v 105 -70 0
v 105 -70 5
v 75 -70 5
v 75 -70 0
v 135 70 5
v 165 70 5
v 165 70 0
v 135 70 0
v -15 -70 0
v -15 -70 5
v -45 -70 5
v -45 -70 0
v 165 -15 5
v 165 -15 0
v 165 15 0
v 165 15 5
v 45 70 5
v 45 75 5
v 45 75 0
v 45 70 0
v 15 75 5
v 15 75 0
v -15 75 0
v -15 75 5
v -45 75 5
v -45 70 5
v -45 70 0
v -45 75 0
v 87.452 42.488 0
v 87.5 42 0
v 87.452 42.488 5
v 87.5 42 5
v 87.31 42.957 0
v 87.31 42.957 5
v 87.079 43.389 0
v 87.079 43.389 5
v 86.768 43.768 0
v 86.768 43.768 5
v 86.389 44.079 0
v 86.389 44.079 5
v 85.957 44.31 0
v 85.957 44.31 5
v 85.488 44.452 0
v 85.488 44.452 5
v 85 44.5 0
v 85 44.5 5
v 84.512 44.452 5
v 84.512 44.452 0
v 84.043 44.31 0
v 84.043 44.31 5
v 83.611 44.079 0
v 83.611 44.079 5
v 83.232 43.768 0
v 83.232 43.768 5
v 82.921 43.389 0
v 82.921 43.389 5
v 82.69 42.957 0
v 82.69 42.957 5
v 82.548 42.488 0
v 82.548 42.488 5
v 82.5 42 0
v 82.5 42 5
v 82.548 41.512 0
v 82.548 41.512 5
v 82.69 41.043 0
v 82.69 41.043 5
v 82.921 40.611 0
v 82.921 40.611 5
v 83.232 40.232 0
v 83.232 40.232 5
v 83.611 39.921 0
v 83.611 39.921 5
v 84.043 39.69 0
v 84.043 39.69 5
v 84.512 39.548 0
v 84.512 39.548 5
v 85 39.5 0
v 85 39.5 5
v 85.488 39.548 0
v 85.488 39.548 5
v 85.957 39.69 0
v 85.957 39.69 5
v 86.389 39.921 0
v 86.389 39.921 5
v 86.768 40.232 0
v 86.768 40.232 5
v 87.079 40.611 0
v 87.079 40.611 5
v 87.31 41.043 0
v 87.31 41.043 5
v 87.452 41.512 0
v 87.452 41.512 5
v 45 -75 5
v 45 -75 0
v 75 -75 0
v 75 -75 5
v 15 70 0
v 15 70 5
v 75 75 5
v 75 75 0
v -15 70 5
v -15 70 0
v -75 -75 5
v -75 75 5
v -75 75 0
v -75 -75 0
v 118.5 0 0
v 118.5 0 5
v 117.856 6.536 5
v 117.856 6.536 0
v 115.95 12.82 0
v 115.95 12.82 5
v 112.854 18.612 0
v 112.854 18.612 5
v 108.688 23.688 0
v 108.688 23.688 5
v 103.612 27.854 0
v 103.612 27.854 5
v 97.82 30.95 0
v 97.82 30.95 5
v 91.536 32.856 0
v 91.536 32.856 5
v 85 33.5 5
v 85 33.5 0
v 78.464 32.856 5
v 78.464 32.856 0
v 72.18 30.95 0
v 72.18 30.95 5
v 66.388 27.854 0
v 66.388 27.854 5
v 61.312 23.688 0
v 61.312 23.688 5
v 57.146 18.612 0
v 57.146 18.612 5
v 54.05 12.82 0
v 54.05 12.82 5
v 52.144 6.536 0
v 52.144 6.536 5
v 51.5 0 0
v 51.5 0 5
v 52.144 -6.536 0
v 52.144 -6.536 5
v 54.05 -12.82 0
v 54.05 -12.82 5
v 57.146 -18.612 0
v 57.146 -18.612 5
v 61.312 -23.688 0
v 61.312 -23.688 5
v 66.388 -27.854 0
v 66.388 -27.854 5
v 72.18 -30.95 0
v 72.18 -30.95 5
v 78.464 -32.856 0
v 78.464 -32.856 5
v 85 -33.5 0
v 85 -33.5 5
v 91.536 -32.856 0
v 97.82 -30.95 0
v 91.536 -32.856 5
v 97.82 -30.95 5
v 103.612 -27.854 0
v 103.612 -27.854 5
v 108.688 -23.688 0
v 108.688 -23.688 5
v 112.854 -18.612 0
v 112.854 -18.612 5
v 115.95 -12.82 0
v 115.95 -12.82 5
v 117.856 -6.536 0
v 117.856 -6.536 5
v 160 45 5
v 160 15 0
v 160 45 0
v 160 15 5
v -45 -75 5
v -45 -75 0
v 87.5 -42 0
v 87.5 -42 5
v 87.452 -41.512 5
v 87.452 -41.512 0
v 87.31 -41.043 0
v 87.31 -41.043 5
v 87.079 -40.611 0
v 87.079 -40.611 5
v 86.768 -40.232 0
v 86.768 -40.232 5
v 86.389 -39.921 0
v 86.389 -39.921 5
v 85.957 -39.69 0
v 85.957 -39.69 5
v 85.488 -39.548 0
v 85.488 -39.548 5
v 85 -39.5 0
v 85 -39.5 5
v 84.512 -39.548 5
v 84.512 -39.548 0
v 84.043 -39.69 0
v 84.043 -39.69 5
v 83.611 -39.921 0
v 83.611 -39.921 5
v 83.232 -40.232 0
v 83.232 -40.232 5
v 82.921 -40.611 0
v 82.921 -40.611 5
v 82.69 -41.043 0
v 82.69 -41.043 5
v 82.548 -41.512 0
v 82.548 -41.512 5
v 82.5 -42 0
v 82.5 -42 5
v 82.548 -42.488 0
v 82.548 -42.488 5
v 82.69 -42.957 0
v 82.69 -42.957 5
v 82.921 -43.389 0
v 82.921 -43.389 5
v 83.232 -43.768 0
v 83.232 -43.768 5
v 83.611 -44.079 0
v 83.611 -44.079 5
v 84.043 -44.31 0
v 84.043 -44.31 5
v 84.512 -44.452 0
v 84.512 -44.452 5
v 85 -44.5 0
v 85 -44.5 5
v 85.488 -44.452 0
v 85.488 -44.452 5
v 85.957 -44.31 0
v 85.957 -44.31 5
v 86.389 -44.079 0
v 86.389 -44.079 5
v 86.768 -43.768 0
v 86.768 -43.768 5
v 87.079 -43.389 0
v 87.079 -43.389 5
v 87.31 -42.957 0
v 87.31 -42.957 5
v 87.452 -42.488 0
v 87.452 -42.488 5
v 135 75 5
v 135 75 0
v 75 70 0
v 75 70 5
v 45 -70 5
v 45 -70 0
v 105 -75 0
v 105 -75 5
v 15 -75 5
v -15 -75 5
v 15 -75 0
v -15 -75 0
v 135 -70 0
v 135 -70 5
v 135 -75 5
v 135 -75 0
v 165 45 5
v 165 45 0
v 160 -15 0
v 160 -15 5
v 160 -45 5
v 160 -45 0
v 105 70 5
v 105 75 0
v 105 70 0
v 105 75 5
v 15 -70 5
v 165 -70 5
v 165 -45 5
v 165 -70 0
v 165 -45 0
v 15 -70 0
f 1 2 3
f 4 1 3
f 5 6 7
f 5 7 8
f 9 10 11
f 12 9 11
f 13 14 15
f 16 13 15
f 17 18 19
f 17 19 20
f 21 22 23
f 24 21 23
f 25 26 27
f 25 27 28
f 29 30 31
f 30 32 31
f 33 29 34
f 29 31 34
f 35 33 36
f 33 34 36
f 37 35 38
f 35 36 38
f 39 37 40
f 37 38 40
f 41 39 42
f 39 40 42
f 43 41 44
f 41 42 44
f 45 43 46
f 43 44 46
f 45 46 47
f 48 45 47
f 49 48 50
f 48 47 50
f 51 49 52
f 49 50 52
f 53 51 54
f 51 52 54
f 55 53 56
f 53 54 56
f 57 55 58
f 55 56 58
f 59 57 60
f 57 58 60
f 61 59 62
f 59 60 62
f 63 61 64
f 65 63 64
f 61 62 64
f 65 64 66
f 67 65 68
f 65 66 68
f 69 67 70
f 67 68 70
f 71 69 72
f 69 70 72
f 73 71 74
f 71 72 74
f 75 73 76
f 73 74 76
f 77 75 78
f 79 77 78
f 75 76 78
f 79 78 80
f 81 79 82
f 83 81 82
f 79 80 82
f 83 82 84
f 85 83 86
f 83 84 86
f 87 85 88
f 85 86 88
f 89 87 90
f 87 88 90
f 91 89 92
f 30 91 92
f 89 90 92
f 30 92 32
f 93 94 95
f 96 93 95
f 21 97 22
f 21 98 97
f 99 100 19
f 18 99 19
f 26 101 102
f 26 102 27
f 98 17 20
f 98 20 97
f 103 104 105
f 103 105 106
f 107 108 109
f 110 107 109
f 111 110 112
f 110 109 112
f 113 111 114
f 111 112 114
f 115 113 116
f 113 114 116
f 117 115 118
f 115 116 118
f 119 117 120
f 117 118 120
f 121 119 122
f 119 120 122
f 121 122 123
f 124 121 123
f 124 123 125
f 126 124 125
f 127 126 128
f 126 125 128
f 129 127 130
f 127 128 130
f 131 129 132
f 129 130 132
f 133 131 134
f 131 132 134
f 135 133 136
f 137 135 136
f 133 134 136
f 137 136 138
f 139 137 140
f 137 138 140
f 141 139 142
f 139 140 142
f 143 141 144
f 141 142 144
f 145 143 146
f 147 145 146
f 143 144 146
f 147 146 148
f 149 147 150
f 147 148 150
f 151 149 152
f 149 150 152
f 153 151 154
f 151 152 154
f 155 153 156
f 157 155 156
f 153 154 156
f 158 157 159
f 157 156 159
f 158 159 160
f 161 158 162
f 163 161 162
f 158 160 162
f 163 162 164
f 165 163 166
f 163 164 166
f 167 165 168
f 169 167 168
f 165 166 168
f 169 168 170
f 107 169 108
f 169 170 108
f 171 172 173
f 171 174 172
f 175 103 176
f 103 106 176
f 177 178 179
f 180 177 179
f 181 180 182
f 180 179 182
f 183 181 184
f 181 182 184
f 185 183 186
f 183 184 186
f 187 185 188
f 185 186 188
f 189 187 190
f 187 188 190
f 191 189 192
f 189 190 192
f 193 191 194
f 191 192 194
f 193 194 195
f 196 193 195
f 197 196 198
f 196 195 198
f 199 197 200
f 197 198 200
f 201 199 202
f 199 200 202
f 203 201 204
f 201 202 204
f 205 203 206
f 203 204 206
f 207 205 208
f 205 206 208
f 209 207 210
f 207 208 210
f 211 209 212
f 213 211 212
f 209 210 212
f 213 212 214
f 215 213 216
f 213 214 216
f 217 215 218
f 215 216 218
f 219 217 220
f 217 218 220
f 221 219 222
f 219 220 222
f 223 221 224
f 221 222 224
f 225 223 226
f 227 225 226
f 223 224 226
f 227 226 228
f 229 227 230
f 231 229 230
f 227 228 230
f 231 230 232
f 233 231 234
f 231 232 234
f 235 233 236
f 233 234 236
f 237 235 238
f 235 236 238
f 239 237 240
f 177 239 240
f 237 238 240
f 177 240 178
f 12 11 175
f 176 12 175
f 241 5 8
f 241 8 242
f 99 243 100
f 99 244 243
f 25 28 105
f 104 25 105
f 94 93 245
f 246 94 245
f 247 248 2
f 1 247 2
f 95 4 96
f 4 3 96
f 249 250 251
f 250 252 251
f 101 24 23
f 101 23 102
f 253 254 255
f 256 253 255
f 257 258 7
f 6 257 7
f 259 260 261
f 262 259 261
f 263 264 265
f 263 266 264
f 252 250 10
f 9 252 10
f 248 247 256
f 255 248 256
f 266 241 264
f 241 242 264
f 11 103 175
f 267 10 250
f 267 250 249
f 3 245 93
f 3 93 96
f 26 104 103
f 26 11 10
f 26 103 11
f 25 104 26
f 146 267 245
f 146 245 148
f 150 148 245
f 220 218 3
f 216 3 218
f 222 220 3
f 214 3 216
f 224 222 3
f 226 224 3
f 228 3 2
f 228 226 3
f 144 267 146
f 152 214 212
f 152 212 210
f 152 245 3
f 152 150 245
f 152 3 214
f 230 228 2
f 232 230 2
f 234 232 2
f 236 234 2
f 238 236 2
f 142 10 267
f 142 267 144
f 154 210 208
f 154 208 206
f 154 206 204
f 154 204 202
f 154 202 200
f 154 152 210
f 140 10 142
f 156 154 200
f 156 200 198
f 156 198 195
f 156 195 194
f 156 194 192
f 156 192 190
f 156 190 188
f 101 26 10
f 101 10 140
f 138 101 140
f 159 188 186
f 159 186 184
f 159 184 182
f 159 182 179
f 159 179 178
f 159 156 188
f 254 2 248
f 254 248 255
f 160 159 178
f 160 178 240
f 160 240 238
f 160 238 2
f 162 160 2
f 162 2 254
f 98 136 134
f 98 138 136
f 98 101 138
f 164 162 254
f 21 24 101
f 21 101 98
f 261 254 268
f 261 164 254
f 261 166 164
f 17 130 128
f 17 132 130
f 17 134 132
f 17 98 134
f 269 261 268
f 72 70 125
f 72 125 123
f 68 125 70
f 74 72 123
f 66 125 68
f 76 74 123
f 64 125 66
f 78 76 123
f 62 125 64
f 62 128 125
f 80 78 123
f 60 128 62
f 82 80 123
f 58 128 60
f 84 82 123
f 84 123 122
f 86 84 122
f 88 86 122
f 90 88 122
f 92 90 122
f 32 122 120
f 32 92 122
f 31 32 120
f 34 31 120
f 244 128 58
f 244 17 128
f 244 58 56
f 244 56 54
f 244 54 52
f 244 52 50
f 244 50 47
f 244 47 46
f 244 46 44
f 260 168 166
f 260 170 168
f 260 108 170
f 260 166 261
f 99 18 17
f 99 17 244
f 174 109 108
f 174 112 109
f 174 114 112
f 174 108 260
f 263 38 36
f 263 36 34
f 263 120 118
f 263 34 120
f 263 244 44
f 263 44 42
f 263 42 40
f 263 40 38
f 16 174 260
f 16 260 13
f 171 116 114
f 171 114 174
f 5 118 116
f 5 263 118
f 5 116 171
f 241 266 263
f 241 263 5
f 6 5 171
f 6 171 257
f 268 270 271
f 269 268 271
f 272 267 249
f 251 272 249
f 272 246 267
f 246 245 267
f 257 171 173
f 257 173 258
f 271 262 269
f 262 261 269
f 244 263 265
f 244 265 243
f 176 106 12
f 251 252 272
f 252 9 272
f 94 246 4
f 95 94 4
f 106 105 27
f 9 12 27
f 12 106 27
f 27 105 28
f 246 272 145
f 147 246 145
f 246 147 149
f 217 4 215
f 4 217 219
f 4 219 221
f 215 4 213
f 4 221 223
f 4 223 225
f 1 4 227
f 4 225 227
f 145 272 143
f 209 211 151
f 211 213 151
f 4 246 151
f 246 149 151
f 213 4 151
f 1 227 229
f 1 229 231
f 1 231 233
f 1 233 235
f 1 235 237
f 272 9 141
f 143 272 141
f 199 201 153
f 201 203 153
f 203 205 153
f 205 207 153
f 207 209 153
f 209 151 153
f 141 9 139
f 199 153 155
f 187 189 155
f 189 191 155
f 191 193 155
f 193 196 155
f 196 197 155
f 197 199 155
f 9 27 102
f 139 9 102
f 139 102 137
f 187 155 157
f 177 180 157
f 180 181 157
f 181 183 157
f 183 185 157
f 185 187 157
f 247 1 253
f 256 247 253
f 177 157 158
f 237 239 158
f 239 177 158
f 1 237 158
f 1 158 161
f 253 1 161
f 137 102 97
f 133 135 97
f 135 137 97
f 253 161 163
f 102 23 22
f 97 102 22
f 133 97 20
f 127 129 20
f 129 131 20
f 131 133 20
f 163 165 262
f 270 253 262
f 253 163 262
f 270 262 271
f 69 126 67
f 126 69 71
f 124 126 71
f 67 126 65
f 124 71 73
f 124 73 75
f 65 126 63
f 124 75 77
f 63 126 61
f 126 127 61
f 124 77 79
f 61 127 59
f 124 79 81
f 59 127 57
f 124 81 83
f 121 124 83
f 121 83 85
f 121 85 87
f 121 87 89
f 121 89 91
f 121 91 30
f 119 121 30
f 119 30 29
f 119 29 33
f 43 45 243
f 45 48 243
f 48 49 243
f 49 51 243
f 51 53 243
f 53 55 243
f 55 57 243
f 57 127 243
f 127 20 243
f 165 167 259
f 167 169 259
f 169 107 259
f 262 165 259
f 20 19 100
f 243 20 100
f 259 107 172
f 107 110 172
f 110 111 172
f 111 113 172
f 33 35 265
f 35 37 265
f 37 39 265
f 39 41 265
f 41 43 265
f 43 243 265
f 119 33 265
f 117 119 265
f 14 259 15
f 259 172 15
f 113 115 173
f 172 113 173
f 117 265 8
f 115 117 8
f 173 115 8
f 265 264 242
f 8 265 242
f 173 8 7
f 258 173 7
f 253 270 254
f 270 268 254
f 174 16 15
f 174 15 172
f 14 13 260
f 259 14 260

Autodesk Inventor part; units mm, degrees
sketch "Sketch1" plane through (0, 0, 0) normal (0, 0, 1) x (1, 0, 0)
  line L0 (0, 2.8582) -> (0, -2.8582) construction
  line L1 (-5.7775, 0) -> (5.7775, 0) construction
  line L2 (-165, -75) -> (165, -75)
  line L3 (165, -75) -> (165, 75)
  line L4 (165, 75) -> (-165, 75)
  line L5 (-165, 75) -> (-165, -75)
  line L6 (-165, -75) -> (165, 75) construction
  line L7 (165, -75) -> (-165, 75) construction
  point P0 (0, 0)
  point P1 (0, 0)
  dimension "d0" = 330
  dimension "d1" = 150
extrude "Extrusion1" add sketch "Sketch1" along normal blind 5
sketch "Sketch2" plane through (0, 0, 5) normal (0, 0, 1) x (1, 0, 0)
  line L0 (0, 0) -> (-130, 0)
  circle A0 centre (-130, 0) radius 5
  line L1 (-165, 75) -> (-165, -75) projected
  line L2 (-165, 0) -> (-165, 15)
  line L3 (-165, 15) -> (-165, -15)
  line L4 (-165, -15) -> (-165, -45)
  line L5 (-165, -45) -> (-165, -75)
  line L6 (-165, 15) -> (-165, 45)
  line L7 (-165, 45) -> (-165, 75)
  line L8 (-165, 15) -> (-160, 15)
  line L9 (-160, 15) -> (-160, 45)
  line L10 (-160, 45) -> (-165, 45)
  line L11 (-165, 45) -> (-165, 15)
  line L12 (-165, -15) -> (-160, -15)
  line L13 (-160, -15) -> (-160, -45)
  line L14 (-160, -45) -> (-165, -45)
  line L15 (-165, -45) -> (-165, -15)
  line L16 (-165, -75) -> (165, -75) projected
  line L17 (-165, -75) -> (-135, -75)
  line L18 (-135, -75) -> (-105, -75)
  line L19 (-105, -75) -> (-75, -75)
  line L20 (-75, -75) -> (-45, -75)
  line L21 (-45, -75) -> (-15, -75)
  line L22 (-15, -75) -> (15, -75)
  line L23 (15, -75) -> (45, -75)
  line L24 (45, -75) -> (75, -75)
  line L25 (75, -75) -> (105, -75)
  line L26 (105, -75) -> (135, -75)
  line L27 (135, -75) -> (165, -75)
  line L28 (-165, -75) -> (-135, -75)
  line L29 (-135, -75) -> (-135, -70)
  line L30 (-135, -70) -> (-165, -70)
  line L31 (-165, -70) -> (-165, -75)
  line L32 (-105, -75) -> (-75, -75)
  line L33 (-75, -75) -> (-75, -70)
  line L34 (-75, -70) -> (-105, -70)
  line L35 (-105, -70) -> (-105, -75)
  line L36 (-45, -75) -> (-15, -75)
  line L37 (-15, -75) -> (-15, -70)
  line L38 (-15, -70) -> (-45, -70)
  line L39 (-45, -70) -> (-45, -75)
  line L40 (15, -75) -> (45, -75)
  line L41 (45, -75) -> (45, -70)
  line L42 (45, -70) -> (15, -70)
  line L43 (15, -70) -> (15, -75)
  line L44 (75, -75) -> (105, -75)
  line L45 (105, -75) -> (105, -70)
  line L46 (105, -70) -> (75, -70)
  line L47 (75, -70) -> (75, -75)
  line L48 (135, -75) -> (165, -75)
  line L49 (165, -75) -> (165, -70)
  line L50 (165, -70) -> (135, -70)
  line L51 (135, -70) -> (135, -75)
  line L52 (165, 75) -> (-165, 75) projected
  line L53 (-165, 75) -> (-135, 75)
  line L54 (-135, 75) -> (-135, 70)
  line L55 (-135, 70) -> (-165, 70)
  line L56 (-165, 70) -> (-165, 75)
  line L57 (-105, 75) -> (-75, 75)
  line L58 (-75, 75) -> (-75, 70)
  line L59 (-75, 70) -> (-105, 70)
  line L60 (-105, 70) -> (-105, 75)
  line L61 (-45, 75) -> (-15, 75)
  line L62 (-15, 75) -> (-15, 70)
  line L63 (-15, 70) -> (-45, 70)
  line L64 (-45, 70) -> (-45, 75)
  line L65 (15, 75) -> (45, 75)
  line L66 (45, 75) -> (45, 70)
  line L67 (45, 70) -> (15, 70)
  line L68 (15, 70) -> (15, 75)
  line L69 (75, 75) -> (105, 75)
  line L70 (105, 75) -> (105, 70)
  line L71 (105, 70) -> (75, 70)
  line L72 (75, 70) -> (75, 75)
  line L73 (165, -75) -> (165, 75) projected
  line L74 (135, 75) -> (165, 75)
  line L75 (165, 75) -> (165, 70)
  line L76 (165, 70) -> (135, 70)
  line L77 (135, 70) -> (135, 75)
  line L78 (165, 0) -> (165, 15)
  line L79 (165, 15) -> (160, 15)
  line L80 (160, 15) -> (160, 45)
  line L81 (160, 45) -> (165, 45)
  line L82 (165, 45) -> (165, 15)
  line L83 (165, -15) -> (160, -15)
  line L84 (160, -15) -> (160, -45)
  line L85 (160, -45) -> (165, -45)
  line L86 (165, -45) -> (165, -15)
  point P0 (-165, -70)
  point P1 (135, 75)
  point P2 (105, 75)
  point P3 (75, 75)
  point P4 (45, 75)
  point P5 (15, 75)
  point P6 (-15, 75)
  point P7 (-165, 70)
  point P8 (-165, -45)
  dimension "d4" = 130
  dimension "d5" = 10
  dimension "d6" = 15
  dimension "d7" = 30
  dimension "d8" = 30
  dimension "d9" = 30
  dimension "d10" = 30
  dimension "d11" = 30
  dimension "d12" = 5
  dimension "d13" = 30
  dimension "d14" = 30
  dimension "d15" = 30
  dimension "d16" = 30
  dimension "d17" = 30
  dimension "d18" = 30
  dimension "d19" = 30
  dimension "d20" = 30
  dimension "d21" = 30
  dimension "d22" = 30
  dimension "d23" = 30
  dimension "d24" = 5
  dimension "d25" = 5
  dimension "d26" = 5
  dimension "d29" = 30
  dimension "d30" = 30
  dimension "d31" = 30
  dimension "d32" = 30
  dimension "d33" = 30
  dimension "d34" = 30
extrude "Extrusion2" cut sketch "Sketch2" against normal blind 5 contours A0 | L52 L54 L55 L1 | L10 L9 L8 L1 | L52 L58 L59 L60 | L52 L62 L63 L64 | L12 L13 L14 L1 | L52 L66 L67 L68 | L30 L29 L16 L1 | L52 L70 L71 L72 | L35 L34 L33 L16 | L52 L73 L76 L77 | L39 L38 L37 L16 | L73 L79 L80 L81 | L43 L42 L41 L16 | L47 L46 L45 L16 | L73 L85 L84 L83 | L51 L50 L49 L16
sketch "Sketch3" plane through (0, 0, 5) normal (0, 0, 1) x (1, 0, 0)
  line L0 (165, -15) -> (165, 15) projected
  line L1 (165, 0) -> (85, 0)
  circle A0 centre (85, 0) radius 33.5
  point P0 (0, 0)
  dimension "d35" = 80
  dimension "d36" = 67
extrude "Extrusion3" cut sketch "Sketch3" against normal blind 10
sketch "Sketch4" plane through (0, 0, 5) normal (0, 0, 1) x (1, 0, 0)
  circle A0 centre (85, 0) radius 33.5 projected
  line L0 (85, 0) -> (85, 42)
  circle A1 centre (85, 42) radius 2.5
  line L1 (85, 0) -> (85, -42)
  circle A2 centre (85, -42) radius 2.5
  point P0 (0, 0)
  dimension "d39" = 42
  dimension "d40" = 5
  dimension "d41" = 42
  dimension "d42" = 5
extrude "Extrusion4" cut sketch "Sketch4" against normal blind 5 contours A2 | A1
sketch "Sketch5" plane through (0, 0, 5) normal (0, 0, 1) x (1, 0, 0)
  line L0 (165, -70) -> (165, -45) projected
  line L1 (165, -70) -> (-75, -70)
  line L2 (-75, -70) -> (-75, 78.5235)
  line L3 (-75, 78.5235) -> (165, 78.5235)
  line L4 (165, 78.5235) -> (165, -70)
  line L5 (-75, 78.5235) -> (-190.1634, 78.5235)
  line L6 (-190.1634, 78.5235) -> (-190.1634, -89.7899)
  line L7 (-190.1634, -89.7899) -> (-75, -89.7899)
  line L8 (-75, -89.7899) -> (-75, 78.5235)
  point P0 (0, 0)
  dimension "d45" = 240
extrude "Extrusion5" cut sketch "Sketch5" against normal blind 10 contours L8 L7 L6 L5 L2
properties part number "Plaat boven" material "S235"
